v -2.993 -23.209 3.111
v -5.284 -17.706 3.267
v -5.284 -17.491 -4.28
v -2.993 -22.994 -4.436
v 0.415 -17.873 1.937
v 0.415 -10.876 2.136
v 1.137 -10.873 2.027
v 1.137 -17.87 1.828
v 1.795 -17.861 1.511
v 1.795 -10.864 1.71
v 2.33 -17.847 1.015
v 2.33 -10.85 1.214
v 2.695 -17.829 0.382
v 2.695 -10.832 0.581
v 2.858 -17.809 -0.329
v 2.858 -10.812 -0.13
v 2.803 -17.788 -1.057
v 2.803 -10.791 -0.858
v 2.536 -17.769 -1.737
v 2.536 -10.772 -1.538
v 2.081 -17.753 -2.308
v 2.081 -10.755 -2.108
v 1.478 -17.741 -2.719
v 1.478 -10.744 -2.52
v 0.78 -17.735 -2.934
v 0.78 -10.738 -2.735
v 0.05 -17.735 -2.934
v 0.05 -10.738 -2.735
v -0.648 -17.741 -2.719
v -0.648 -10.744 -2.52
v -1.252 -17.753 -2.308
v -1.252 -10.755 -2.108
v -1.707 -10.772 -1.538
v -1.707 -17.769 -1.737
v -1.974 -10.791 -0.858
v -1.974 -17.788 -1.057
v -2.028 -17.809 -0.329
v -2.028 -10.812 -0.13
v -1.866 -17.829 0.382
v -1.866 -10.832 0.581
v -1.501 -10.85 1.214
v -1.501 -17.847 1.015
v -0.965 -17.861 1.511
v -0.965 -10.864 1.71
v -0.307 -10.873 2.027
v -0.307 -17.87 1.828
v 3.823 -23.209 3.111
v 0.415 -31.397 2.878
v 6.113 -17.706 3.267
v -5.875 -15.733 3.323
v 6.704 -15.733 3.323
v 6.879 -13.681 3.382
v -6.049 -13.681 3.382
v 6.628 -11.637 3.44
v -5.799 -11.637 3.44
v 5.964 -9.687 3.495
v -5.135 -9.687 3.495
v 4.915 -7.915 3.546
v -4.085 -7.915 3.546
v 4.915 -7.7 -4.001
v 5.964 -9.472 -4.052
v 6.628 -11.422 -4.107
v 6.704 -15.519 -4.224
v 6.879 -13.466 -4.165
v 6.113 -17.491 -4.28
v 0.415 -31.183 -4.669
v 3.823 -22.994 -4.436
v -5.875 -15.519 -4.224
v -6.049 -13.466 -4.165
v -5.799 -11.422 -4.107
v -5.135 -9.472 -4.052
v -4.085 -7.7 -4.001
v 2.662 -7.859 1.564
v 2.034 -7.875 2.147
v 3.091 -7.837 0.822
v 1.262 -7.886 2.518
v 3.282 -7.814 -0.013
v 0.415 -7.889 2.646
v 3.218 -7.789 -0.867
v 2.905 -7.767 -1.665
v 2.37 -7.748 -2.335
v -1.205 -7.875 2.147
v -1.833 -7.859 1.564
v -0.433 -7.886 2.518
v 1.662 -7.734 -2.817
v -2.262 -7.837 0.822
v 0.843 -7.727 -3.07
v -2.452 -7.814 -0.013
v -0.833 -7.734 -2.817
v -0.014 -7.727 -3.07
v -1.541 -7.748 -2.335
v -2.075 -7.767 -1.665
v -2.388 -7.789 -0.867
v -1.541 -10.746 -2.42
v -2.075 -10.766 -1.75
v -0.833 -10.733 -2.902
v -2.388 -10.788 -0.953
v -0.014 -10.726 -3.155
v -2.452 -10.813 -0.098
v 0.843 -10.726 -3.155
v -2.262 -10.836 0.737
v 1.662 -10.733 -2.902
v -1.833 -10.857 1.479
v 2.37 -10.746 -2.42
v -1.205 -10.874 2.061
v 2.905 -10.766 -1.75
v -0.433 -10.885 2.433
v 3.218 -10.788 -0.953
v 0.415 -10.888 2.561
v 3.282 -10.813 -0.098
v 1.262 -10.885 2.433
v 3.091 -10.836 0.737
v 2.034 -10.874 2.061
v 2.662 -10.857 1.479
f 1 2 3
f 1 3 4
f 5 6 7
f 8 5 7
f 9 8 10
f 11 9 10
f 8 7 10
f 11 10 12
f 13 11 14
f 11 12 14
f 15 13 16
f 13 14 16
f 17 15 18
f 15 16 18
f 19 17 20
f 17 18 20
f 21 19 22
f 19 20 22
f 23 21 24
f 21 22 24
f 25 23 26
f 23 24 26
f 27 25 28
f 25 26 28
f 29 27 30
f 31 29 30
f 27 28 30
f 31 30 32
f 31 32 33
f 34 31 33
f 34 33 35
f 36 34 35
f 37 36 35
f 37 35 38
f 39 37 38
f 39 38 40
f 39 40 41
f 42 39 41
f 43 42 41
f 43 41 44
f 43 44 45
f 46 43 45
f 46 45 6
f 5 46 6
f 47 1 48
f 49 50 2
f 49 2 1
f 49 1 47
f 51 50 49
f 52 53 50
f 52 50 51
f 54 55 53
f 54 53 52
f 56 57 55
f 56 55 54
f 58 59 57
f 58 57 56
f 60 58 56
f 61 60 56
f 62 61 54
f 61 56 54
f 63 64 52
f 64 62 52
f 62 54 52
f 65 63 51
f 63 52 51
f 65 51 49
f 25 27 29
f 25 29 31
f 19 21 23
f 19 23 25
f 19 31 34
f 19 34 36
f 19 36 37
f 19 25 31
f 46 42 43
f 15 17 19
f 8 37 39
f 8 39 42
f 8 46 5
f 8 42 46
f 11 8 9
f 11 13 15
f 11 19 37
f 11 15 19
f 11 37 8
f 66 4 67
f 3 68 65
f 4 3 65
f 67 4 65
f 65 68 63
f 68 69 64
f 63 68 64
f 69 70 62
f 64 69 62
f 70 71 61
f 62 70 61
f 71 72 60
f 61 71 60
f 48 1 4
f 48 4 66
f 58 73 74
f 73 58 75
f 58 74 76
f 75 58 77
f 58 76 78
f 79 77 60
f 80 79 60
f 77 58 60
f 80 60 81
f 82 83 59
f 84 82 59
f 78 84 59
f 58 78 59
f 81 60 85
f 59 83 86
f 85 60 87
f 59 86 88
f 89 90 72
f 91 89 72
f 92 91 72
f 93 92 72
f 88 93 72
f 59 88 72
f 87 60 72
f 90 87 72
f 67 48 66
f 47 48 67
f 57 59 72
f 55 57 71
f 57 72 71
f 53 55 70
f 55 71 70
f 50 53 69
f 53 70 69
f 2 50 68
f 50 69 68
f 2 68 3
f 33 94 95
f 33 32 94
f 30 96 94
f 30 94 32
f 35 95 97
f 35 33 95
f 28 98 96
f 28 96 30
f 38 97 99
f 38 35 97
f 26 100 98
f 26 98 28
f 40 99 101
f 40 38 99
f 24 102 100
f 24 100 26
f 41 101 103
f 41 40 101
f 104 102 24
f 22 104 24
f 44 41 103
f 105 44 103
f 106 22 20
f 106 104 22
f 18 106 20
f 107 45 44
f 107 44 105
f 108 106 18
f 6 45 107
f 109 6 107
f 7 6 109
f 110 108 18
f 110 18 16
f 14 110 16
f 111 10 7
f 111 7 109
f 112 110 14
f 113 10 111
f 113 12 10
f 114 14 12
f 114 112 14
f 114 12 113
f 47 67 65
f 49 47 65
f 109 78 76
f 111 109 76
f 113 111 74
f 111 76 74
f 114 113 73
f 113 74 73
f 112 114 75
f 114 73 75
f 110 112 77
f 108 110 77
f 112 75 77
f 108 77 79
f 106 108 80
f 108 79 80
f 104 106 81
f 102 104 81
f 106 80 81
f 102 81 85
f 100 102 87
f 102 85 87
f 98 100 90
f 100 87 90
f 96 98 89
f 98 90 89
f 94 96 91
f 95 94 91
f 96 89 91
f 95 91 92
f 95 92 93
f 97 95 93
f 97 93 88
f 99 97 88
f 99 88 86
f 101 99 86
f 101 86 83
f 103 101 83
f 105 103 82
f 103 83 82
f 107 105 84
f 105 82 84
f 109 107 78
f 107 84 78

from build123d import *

# Parameters (mm, degrees)
BOSS_EXTRUDE1_DEPTH      = 4.35
BOSS_EXTRUDE1_DEPTH_BACK = 3.2
SKETCH4_R                = 2.45
CUT_EXTRUDE2_DEPTH       = 10
SKETCH4_5_R              = 2.875
SKETCH4_5_R_2            = 2.45
CUT_EXTRUDE3_DEPTH       = 3
FILLET1_R                = 10
BOSS_EXTRUDE2_DEPTH      = 7.55


with BuildPart() as part:
    # Sketch2 → Boss-Extrude1 (new, two sides: drawn at the far end of the back side and taken through both)
    with BuildSketch(Plane(origin=(0, 0.021487422, -0.580480419), x_dir=(1, 0, 0), z_dir=(0, -0.02843310858496513, 0.9995956974378171)).offset(-BOSS_EXTRUDE1_DEPTH_BACK)):
        Polygon((-13.116179094, 1.214943373), (-10.360421829, -5.408768885), (-2.99346614, -23.115914326), (3.822823349, -23.115914326), (11.189779038, -5.408768885), (13.945536303, 1.214943373), (9.430107454, -3.300485476), (4.914678604, -7.815914326), (-4.085321396, -7.815914326), (-8.600750245, -3.300485476), align=None)
    extrude(amount=BOSS_EXTRUDE1_DEPTH + BOSS_EXTRUDE1_DEPTH_BACK)

    # Sketch4 → Cut-Extrude2 (cut)
    with BuildSketch(Plane(origin=(0, -7.80778247, -0.222089318), x_dir=(1, 0, 0), z_dir=(0, 0.9995956974378171, 0.02843310858496514))):
        with Locations(Location((0.414678604, 0.005856684, 0), (0, 0, 270))):
            Circle(SKETCH4_R)
    extrude(amount=-CUT_EXTRUDE2_DEPTH, mode=Mode.SUBTRACT)

    # Sketch4<5> → Cut-Extrude3 (cut)
    with BuildSketch(Plane(origin=(0, -7.80778247, -0.222089318), x_dir=(1, 0, 0), z_dir=(0, 0.9995956974378171, 0.02843310858496514))):
        with Locations(Location((0.414678604, 0.005856684, 0), (0, 0, 270))):
            Circle(SKETCH4_5_R)
        with Locations(Location((0.414678604, 0.005856684, 0), (0, 0, 270))):
            Circle(SKETCH4_5_R_2, mode=Mode.SUBTRACT)
    extrude(amount=-CUT_EXTRUDE3_DEPTH, mode=Mode.SUBTRACT)

    # Fillet1
    # the kernel refuses this fillet: 10 mm, written as the material it takes off along each edge
    with BuildSketch(Plane(origin=(13.945536303, -0.3371442, 54.757471627), x_dir=(-0.7071067811865475, -0.7068208961031768, -0.020105243890642274), z_dir=(0, 0.028433108584965117, -0.999595697437817)), Plane(origin=(-13.116179094, 2.776325306, -54.69980818), x_dir=(0.7071067811865489, -0.7068208961031754, -0.020105243890642235), z_dir=(0, -0.028433108584965117, 0.999595697437817))) as fillet1_piece_1:
        with BuildLine():
            CenterArc((22.662755022, 1.47115243), FILLET1_R, 188.459787479, 59.129683347)
            Line((18.850352296, -7.773607462), (0, 0))
            Line((0, 0), (12.771561437, 0))
        make_face()
    extrude(amount=109.501551565, mode=Mode.SUBTRACT)

    # Sketch6 → Boss-Extrude2 (add)
    with BuildSketch(Plane(origin=(0, -0.107168461, 3.767619442), x_dir=(1, 0, 0), z_dir=(0, -0.02843310858496513, 0.9995956974378171))):
        Polygon((-2.99346614, -23.110940453), (0.414678604, -31.302725123), (3.822823349, -23.110940453), align=None)
    extrude(amount=-BOSS_EXTRUDE2_DEPTH)


solid = part.part
